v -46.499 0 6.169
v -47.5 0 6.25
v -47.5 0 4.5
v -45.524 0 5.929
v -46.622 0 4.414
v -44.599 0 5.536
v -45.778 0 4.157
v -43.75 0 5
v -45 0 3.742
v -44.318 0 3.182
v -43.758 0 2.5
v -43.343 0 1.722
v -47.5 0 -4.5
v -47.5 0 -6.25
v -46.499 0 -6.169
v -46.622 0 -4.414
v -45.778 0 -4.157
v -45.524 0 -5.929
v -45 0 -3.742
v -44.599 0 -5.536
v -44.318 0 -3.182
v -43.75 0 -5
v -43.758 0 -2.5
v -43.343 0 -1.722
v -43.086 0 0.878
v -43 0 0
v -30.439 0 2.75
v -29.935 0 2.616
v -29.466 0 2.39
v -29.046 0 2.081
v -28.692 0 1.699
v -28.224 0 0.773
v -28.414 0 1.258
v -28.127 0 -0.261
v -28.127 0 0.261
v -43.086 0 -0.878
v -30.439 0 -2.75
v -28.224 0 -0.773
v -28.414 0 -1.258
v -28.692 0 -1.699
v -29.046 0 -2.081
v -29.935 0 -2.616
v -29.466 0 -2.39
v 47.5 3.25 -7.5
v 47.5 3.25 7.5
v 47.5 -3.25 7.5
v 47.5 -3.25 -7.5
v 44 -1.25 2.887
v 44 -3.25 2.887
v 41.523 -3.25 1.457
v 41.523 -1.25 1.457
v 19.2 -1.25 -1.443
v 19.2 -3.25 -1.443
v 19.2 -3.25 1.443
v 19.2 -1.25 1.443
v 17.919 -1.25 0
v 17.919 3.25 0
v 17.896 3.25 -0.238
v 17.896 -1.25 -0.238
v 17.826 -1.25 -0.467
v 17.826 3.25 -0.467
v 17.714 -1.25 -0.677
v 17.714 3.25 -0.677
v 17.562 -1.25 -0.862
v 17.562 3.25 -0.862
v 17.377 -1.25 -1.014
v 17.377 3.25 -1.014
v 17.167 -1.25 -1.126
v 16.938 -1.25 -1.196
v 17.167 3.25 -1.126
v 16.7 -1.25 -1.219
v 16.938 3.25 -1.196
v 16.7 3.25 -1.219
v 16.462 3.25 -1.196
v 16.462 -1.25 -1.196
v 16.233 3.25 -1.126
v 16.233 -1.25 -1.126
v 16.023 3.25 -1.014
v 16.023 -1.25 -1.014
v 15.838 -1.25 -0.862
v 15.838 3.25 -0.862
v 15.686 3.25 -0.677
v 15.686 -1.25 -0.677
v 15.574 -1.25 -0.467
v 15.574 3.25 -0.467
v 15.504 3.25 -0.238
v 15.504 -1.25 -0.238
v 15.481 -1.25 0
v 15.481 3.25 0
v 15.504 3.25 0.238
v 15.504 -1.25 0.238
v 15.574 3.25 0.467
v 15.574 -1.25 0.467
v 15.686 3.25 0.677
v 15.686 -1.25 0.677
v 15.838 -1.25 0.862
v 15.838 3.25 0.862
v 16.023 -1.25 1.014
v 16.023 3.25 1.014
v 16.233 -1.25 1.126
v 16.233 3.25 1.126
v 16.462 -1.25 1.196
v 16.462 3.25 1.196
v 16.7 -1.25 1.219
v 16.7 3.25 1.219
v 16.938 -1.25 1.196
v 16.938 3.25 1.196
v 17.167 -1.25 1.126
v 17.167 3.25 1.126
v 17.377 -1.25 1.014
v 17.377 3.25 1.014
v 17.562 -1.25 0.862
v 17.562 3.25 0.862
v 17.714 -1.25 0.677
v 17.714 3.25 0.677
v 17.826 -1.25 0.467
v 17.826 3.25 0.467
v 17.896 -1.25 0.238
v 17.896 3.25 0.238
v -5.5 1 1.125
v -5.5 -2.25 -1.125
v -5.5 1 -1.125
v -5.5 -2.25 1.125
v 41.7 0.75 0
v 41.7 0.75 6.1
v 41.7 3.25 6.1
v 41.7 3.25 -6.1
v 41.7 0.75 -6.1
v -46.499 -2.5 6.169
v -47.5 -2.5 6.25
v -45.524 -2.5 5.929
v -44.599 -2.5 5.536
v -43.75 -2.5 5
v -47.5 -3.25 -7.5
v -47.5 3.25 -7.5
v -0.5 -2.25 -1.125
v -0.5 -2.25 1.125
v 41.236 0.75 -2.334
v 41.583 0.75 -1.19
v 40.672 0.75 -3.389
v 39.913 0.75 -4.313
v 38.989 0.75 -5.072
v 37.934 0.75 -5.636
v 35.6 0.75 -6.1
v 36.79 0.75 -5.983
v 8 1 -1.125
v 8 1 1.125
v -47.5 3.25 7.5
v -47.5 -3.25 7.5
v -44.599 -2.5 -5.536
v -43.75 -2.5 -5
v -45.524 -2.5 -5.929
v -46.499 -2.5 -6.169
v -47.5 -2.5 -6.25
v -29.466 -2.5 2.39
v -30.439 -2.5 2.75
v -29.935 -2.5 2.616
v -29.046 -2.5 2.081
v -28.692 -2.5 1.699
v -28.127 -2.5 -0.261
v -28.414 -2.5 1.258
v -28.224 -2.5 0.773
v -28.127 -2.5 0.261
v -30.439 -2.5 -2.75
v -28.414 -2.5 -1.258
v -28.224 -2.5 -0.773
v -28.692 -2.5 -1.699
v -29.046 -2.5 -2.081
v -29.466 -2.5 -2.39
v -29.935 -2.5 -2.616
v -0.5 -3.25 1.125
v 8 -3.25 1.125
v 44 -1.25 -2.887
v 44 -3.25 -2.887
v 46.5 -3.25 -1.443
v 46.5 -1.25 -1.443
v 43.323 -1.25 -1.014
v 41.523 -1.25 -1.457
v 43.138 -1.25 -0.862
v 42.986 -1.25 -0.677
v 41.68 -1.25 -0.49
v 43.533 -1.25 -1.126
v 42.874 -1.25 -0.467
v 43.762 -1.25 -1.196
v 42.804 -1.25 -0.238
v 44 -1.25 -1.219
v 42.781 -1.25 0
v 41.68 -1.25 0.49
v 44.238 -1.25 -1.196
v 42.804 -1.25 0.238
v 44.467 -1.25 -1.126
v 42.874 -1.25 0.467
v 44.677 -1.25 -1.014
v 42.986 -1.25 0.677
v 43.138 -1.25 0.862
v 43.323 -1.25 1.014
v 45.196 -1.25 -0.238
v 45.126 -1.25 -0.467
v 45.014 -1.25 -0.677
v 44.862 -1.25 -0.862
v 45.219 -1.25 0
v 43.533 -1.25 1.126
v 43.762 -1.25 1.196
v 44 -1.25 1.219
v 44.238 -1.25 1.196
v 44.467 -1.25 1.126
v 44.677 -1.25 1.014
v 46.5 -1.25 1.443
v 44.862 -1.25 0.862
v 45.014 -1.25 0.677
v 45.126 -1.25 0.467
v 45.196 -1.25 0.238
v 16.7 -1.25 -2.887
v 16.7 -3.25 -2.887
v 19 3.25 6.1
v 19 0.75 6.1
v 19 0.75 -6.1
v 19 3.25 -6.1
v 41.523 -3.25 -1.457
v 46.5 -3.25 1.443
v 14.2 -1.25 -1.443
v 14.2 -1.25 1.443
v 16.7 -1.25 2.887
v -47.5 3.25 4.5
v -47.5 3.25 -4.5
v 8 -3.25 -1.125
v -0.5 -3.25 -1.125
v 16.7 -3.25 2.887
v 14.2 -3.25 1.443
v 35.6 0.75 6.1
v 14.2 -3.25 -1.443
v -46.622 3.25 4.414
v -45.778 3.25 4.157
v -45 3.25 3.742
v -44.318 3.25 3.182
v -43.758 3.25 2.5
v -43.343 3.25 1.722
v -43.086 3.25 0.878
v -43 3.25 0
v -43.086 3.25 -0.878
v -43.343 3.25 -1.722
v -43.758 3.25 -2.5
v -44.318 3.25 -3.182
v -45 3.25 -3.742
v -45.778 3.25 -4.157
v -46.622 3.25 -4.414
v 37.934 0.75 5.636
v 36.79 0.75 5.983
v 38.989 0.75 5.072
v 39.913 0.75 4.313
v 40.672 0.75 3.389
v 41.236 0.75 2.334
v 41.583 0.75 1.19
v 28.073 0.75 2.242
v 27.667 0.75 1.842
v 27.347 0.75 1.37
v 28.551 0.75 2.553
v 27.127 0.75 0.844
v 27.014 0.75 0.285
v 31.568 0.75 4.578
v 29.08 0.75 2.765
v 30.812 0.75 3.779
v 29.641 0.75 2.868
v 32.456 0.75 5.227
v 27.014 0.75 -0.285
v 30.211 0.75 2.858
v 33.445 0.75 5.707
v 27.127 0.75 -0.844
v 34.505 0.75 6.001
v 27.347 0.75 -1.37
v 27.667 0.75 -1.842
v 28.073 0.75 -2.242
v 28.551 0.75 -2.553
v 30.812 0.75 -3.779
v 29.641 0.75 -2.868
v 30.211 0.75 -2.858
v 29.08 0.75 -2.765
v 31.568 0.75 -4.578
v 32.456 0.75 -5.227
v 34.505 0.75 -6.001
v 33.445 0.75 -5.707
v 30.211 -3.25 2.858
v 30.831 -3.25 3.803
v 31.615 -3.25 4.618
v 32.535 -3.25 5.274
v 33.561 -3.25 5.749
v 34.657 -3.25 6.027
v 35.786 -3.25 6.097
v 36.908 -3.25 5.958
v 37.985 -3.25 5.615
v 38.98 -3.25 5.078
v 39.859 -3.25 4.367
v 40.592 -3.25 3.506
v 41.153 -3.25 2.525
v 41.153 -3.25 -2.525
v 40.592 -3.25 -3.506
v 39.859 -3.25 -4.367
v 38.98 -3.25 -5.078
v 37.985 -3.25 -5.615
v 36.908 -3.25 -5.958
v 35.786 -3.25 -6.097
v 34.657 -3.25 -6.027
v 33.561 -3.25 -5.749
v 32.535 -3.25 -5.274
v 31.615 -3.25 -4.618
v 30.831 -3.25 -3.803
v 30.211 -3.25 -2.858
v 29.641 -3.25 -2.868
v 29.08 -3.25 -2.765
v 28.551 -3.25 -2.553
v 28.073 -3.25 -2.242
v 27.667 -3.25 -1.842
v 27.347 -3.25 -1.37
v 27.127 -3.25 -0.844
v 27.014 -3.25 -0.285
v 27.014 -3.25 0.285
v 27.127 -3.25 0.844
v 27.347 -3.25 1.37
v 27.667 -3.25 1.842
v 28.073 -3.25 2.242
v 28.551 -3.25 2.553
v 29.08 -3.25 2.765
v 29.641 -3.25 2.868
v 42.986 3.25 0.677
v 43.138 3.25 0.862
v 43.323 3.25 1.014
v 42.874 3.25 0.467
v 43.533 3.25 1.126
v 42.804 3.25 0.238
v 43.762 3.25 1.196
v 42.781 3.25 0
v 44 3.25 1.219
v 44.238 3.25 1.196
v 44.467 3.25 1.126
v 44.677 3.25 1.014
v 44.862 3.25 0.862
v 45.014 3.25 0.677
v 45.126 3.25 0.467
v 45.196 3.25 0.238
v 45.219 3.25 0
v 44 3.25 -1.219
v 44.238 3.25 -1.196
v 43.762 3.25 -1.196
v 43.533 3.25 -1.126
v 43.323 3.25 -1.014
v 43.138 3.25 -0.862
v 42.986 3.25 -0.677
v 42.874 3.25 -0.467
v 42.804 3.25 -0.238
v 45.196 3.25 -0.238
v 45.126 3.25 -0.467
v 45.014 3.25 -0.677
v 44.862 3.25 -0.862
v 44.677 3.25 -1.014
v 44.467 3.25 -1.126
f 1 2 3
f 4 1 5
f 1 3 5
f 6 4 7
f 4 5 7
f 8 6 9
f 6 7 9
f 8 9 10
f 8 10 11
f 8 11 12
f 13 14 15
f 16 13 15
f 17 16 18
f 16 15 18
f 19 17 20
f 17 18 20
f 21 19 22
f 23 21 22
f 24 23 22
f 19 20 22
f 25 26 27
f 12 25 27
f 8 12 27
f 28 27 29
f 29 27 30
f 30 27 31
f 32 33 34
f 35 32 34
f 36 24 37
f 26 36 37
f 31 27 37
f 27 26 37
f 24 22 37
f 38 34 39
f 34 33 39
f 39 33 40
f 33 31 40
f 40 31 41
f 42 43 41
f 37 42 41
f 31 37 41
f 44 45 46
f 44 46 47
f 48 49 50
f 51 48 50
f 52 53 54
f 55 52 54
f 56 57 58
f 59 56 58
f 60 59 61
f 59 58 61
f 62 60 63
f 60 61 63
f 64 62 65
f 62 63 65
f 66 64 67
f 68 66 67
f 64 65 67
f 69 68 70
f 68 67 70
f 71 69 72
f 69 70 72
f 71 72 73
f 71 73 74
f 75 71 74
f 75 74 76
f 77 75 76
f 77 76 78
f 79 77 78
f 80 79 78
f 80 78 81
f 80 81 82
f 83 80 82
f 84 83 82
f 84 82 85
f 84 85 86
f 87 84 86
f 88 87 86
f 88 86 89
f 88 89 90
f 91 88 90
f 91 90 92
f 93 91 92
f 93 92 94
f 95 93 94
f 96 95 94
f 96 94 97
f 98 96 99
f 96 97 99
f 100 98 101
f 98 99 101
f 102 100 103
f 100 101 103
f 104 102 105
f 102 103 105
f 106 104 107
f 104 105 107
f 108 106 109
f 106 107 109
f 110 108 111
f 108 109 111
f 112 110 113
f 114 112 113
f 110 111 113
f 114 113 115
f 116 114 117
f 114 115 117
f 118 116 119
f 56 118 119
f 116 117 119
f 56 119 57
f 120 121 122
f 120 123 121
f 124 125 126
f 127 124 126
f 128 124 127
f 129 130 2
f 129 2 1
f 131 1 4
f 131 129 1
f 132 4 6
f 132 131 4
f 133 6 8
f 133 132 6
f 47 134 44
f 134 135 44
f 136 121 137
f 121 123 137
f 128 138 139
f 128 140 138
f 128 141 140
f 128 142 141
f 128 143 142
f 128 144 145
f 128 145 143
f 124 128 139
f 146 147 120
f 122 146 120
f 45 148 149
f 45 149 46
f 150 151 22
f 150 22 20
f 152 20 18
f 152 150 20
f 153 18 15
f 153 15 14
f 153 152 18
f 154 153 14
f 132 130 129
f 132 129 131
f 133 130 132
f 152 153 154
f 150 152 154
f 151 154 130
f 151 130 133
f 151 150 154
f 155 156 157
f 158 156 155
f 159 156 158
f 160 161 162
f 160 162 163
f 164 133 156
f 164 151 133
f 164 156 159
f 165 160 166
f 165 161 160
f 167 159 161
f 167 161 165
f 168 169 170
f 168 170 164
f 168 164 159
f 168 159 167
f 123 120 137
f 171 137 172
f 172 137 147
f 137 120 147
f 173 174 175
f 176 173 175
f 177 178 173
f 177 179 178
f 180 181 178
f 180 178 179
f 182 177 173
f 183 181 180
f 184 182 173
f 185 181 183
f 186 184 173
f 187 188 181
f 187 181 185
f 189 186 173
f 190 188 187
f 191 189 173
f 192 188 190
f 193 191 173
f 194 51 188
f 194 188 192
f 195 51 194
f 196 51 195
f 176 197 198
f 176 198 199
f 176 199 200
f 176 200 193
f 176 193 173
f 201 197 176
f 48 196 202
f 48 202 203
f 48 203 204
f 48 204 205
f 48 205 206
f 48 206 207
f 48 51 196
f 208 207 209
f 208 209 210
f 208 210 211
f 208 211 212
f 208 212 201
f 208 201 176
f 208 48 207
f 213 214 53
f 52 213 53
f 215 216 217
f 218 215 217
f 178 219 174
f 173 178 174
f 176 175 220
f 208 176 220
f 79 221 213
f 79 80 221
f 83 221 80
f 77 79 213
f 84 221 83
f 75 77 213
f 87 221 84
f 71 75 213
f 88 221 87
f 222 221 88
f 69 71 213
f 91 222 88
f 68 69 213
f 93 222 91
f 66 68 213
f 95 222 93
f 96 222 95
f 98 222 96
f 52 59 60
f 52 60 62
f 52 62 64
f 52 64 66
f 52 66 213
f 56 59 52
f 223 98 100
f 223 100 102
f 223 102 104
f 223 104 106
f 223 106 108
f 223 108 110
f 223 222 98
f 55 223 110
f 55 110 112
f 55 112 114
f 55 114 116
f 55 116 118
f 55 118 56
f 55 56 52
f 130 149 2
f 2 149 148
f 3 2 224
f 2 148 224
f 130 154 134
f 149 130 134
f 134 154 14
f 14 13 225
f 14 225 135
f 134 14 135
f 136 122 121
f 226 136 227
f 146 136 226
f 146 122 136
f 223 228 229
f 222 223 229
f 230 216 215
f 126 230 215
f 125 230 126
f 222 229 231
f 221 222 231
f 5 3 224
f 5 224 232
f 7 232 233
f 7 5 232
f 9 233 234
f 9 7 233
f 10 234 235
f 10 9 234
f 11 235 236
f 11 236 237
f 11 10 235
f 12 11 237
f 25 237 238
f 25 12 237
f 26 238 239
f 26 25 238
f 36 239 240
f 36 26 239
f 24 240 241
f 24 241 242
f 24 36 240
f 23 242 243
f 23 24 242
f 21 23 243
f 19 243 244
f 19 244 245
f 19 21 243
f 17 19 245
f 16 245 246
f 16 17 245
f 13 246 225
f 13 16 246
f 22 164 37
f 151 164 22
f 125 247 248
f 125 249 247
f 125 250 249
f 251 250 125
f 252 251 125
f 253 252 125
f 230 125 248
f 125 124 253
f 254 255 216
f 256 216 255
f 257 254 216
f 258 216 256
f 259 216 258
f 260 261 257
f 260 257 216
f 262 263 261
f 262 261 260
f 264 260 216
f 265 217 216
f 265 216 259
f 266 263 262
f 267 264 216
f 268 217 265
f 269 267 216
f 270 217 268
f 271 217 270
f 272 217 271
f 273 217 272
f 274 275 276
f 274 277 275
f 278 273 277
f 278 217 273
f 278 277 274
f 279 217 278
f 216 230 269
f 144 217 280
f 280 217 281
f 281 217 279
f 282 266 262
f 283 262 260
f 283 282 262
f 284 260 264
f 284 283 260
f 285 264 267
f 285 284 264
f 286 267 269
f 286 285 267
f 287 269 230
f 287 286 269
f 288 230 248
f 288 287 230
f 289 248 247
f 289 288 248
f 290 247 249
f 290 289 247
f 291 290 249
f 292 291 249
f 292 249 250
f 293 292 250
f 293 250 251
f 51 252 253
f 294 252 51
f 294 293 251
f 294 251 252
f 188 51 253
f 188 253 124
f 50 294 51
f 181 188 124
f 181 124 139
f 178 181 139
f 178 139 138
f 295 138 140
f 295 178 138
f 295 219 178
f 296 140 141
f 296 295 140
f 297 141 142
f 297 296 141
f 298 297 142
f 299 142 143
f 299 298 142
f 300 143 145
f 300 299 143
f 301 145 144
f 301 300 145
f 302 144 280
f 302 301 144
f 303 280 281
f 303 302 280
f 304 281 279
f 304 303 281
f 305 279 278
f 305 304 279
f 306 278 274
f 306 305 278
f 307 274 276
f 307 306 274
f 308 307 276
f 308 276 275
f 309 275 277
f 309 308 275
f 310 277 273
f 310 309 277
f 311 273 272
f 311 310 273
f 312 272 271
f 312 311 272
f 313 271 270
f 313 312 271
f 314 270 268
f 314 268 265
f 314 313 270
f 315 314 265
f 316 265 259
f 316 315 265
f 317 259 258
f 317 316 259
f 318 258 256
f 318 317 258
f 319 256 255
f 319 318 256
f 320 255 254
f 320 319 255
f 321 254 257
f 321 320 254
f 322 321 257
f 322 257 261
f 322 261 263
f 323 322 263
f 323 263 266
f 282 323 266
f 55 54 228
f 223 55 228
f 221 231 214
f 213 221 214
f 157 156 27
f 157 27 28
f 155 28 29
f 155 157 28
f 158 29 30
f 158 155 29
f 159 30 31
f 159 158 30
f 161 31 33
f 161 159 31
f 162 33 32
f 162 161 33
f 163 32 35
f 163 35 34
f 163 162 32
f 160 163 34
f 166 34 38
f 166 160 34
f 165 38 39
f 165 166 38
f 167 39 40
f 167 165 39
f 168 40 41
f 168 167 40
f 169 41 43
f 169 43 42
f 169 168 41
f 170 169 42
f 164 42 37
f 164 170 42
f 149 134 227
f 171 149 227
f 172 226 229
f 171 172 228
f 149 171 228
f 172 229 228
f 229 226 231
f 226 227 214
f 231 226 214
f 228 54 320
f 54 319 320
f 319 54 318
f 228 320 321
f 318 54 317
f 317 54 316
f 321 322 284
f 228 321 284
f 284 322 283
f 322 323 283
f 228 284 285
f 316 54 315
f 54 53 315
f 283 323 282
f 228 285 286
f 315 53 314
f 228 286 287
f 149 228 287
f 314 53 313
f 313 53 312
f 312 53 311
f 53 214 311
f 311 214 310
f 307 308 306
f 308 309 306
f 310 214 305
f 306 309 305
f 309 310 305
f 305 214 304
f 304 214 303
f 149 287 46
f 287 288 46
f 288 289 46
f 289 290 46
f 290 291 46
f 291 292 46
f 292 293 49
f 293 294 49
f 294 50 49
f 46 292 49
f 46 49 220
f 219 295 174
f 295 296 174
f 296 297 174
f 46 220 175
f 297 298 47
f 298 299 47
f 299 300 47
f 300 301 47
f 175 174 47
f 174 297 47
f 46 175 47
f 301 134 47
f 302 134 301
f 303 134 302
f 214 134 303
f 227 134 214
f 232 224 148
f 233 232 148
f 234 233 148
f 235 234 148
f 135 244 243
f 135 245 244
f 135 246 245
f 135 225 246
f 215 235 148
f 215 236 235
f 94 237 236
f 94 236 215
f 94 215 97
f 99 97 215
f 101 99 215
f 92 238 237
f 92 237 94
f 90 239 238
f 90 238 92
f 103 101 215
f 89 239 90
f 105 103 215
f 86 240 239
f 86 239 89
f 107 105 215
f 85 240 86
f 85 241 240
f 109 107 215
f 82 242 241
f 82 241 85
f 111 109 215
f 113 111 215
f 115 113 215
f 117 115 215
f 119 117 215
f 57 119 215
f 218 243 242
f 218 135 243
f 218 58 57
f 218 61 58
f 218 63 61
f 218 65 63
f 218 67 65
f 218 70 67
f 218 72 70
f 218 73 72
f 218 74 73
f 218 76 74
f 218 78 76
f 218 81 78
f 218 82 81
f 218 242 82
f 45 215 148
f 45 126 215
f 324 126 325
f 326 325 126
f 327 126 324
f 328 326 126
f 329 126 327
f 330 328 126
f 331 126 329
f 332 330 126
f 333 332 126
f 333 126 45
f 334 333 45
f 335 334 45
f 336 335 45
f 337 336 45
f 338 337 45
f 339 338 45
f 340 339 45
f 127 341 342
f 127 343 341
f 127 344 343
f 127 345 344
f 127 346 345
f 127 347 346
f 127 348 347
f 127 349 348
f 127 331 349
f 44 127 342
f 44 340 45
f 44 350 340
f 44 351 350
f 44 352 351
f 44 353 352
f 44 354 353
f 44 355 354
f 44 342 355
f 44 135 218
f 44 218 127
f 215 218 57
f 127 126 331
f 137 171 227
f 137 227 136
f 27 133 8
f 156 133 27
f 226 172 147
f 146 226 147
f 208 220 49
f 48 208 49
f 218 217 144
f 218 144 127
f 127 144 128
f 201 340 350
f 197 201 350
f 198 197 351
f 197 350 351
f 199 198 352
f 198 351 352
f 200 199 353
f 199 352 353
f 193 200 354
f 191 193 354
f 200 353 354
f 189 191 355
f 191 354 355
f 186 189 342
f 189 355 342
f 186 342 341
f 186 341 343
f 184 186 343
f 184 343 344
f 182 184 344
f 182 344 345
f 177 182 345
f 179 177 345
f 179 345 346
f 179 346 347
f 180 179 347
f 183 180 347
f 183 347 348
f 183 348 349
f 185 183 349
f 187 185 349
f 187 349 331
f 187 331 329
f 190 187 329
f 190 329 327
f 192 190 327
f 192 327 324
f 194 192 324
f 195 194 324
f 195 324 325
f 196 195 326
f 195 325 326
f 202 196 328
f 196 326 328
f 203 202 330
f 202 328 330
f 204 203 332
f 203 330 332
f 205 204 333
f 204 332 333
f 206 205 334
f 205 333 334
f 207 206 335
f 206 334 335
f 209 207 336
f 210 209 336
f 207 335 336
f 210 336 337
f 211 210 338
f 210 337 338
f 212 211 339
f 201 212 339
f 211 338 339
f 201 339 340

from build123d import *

# Parameters (mm, degrees)
SKETCH2_W                   = 95
SKETCH2_H                   = 15
BOSS_EXTRUDE1_DEPTH         = 3.25
CAVITY1_START               = -2.5
CAVITY1_DEPTH               = 2.5
CAVITY1_START_2             = -1.5
CAVITY1_2_DEPTH             = 4.75
CAVITY1_3_DEPTH             = 1.5
CUT_EXTRUDE1_START          = -5.75
CUT_EXTRUDE1_DEPTH          = 5.75
CUT_EXTRUDE2_START          = -1
CUT_EXTRUDE2_DEPTH          = 1
F_41_0_096_DIAMETER_HOLE1_D = 2.4384
CUT_EXTRUDE4_DEPTH          = 2
CAVITY2_START               = -3.25
CAVITY2_DEPTH               = 6.5
CAVITY2_START_2             = 0.75
CAVITY2_2_DEPTH             = 2.5
SKETCH12_W                  = 22.7
SKETCH12_H                  = 12.2
SKETCH12_W_2                = 22.5
SKETCH12_H_2                = 12
CUT_EXTRUDE6_DEPTH          = 2.5
CUT_EXTRUDE7_START          = -4
CUT_EXTRUDE7_DEPTH          = 4
SKETCH15_W                  = 8.5
SKETCH15_H                  = 4.25
SKETCH15_W_2                = 5
SKETCH15_H_2                = 3.25
CUT_EXTRUDE8_DEPTH          = 1.125


# Read off the part's stored shape, not the designer's step: Cavity1, Cavity2
with BuildPart() as part:
    # Sketch2 → Boss-Extrude1 (new, symmetric)
    with BuildSketch(Plane(origin=(0, 0, 0), x_dir=(1, 0, 0), z_dir=(0, 1, 0))):
        Rectangle(SKETCH2_W, SKETCH2_H)
    extrude(amount=BOSS_EXTRUDE1_DEPTH, both=True)

    # Cavity1 outline → Cavity1 (cut)
    with BuildSketch(Plane(origin=(0, 0, 0), x_dir=(1, 0, 0), z_dir=(0, 1, 0)).offset(CAVITY1_START)):
        with BuildLine():
            ThreePointArc((-47.5, 2.875), (-44.625, 0), (-47.5, -2.875))
            Line((-47.5, -2.875), (-47.5, -3.425))
            ThreePointArc((-47.5, -3.425), (-44.075, 0), (-47.5, 3.425))
            Line((-47.5, 3.425), (-47.5, 2.875))
        make_face()
        with BuildLine():
            Line((-47.5, 6.25), (-47.5, 4.5))
            ThreePointArc((-47.5, 4.5), (-43, 0), (-47.5, -4.5))
            Line((-47.5, -4.5), (-47.5, -6.25))
            ThreePointArc((-47.5, -6.25), (-45.523576462, -5.929270613), (-43.75, -5))
            Line((-43.75, -5), (-30.438820488, -2.75))
            ThreePointArc((-30.438820488, -2.75), (-28.114646288, 0), (-30.438820488, 2.75))
            Line((-30.438820488, 2.75), (-43.75, 5))
            ThreePointArc((-43.75, 5), (-45.523576462, 5.929270613), (-47.5, 6.25))
        make_face()
    extrude(amount=CAVITY1_DEPTH, mode=Mode.SUBTRACT)

    # Cavity1 2 outline → Cavity1 2 (cut)
    with BuildSketch(Plane(origin=(0, 0, 0), x_dir=(1, 0, 0), z_dir=(0, 1, 0)).offset(CAVITY1_START_2)):
        with BuildLine():
            ThreePointArc((-47.5, 3), (-44.5, 0), (-47.5, -3))
            Line((-47.5, -3), (-47.5, -4.5))
            ThreePointArc((-47.5, -4.5), (-43, 0), (-47.5, 4.5))
            Line((-47.5, 4.5), (-47.5, 3))
        make_face()
    extrude(amount=CAVITY1_2_DEPTH, mode=Mode.SUBTRACT)

    # Cavity1 3 outline → Cavity1 3 (cut)
    with BuildSketch(Plane(origin=(0, 0, 0), x_dir=(1, 0, 0), z_dir=(0, 1, 0)).offset(CAVITY1_START_2)):
        with BuildLine():
            Line((-47.5, 2.875), (-47.5, 1.5))
            ThreePointArc((-47.5, 1.5), (-46, 0), (-47.5, -1.5))
            Line((-47.5, -1.5), (-47.5, -2.875))
            ThreePointArc((-47.5, -2.875), (-44.625, 0), (-47.5, 2.875))
        make_face()
    extrude(amount=CAVITY1_3_DEPTH, mode=Mode.SUBTRACT)

    # Sketch4 → Cut-Extrude1 (cut)
    with BuildSketch(Plane(origin=(0, 3.25, 0), x_dir=(1, 0, 0), z_dir=(0, 1, 0)).offset(CUT_EXTRUDE1_START)):
        with BuildLine():
            Line((-47.5, 3), (-47.5, -3))
            ThreePointArc((-47.5, -3), (-44.5, 0), (-47.5, 3))
        make_face()
    extrude(amount=CUT_EXTRUDE1_DEPTH, mode=Mode.SUBTRACT)

    # Sketch6 → Cut-Extrude2 (cut)
    with BuildSketch(Plane(origin=(0, -1.5, 0), x_dir=(1, 0, 0), z_dir=(0, 1, 0)).offset(CUT_EXTRUDE2_START)):
        with BuildLine():
            Line((-47.5, 4.5), (-47.5, 3.425))
            ThreePointArc((-47.5, 3.425), (-44.075, 0), (-47.5, -3.425))
            Line((-47.5, -3.425), (-47.5, -4.5))
            ThreePointArc((-47.5, -4.5), (-43, 0), (-47.5, 4.5))
        make_face()
    extrude(amount=CUT_EXTRUDE2_DEPTH, mode=Mode.SUBTRACT)

    # #41 (0.096) Diameter Hole1 (through all)
    with Locations(Plane(origin=(0, -3.25, 0), x_dir=(-1, 0, 0), z_dir=(0, -1, 0))):
        with Locations((-44, 0), (-16.7, 0)):
            Hole(F_41_0_096_DIAMETER_HOLE1_D / 2)

    # Sketch10 → Cut-Extrude4 (cut)
    with BuildSketch(Plane.XZ.offset(3.25)):
        Polygon((46.5, -1.443375673), (46.5, 1.443375673), (44, 2.886751346), (41.5, 1.443375673), (41.5, -1.443375673), (44, -2.886751346), align=None)
        Polygon((16.7, 2.886751346), (14.2, 1.443375673), (14.2, -1.443375673), (16.7, -2.886751346), (19.2, -1.443375673), (19.2, 1.443375673), align=None)
    extrude(amount=-CUT_EXTRUDE4_DEPTH, mode=Mode.SUBTRACT)

    # Cavity2 outline → Cavity2 (cut)
    with BuildSketch(Plane(origin=(0, 0, 0), x_dir=(1, 0, 0), z_dir=(0, 1, 0)).offset(CAVITY2_START)):
        with BuildLine():
            ThreePointArc((30.267317748, -2.75), (41.6, 0), (30.267317748, 2.75))
            ThreePointArc((30.267317748, 2.75), (27.1, 0), (30.267317748, -2.75))
        make_face()
    extrude(amount=CAVITY2_DEPTH, mode=Mode.SUBTRACT)

    # Cavity2 2 outline → Cavity2 2 (cut)
    with BuildSketch(Plane(origin=(0, 0, 0), x_dir=(1, 0, 0), z_dir=(0, 1, 0)).offset(CAVITY2_START_2)):
        with BuildLine():
            Line((19.1, 6), (19.1, -6))
            Line((19.1, -6), (35.6, -6))
            ThreePointArc((35.6, -6), (32.477501001, -5.123475383), (30.267317748, -2.75))
            ThreePointArc((30.267317748, -2.75), (27.1, 0), (30.267317748, 2.75))
            ThreePointArc((30.267317748, 2.75), (32.477501001, 5.123475383), (35.6, 6))
            Line((35.6, 6), (19.1, 6))
        make_face()
        with BuildLine():
            ThreePointArc((41.5, -1.090871211), (39.4376277, -4.61222437), (35.6, -6))
            Line((35.6, -6), (41.6, -6))
            Line((41.6, -6), (41.6, 0))
            ThreePointArc((41.6, 0), (41.574947699, -0.547722558), (41.5, -1.090871211))
        make_face()
        with BuildLine():
            Line((41.6, 6), (35.6, 6))
            ThreePointArc((35.6, 6), (39.4376277, 4.612224369), (41.5, 1.090871211))
            ThreePointArc((41.5, 1.090871211), (41.574947699, 0.547722558), (41.6, 0))
            Line((41.6, 0), (41.6, 6))
        make_face()
    extrude(amount=CAVITY2_2_DEPTH, mode=Mode.SUBTRACT)

    # Sketch12 → Cut-Extrude6 (cut)
    with BuildSketch(Plane(origin=(0, 0.75, 0), x_dir=(1, 0, 0), z_dir=(0, 1, 0))):
        with Locations((30.35, 0)):
            Rectangle(SKETCH12_W, SKETCH12_H)
        with Locations((30.35, 0)):
            Rectangle(SKETCH12_W_2, SKETCH12_H_2, mode=Mode.SUBTRACT)
    extrude(amount=CUT_EXTRUDE6_DEPTH, mode=Mode.SUBTRACT)

    # Sketch13 → Cut-Extrude7 (cut)
    with BuildSketch(Plane(origin=(0, 0.75, 0), x_dir=(1, 0, 0), z_dir=(0, 1, 0)).offset(CUT_EXTRUDE7_START)):
        with BuildLine():
            ThreePointArc((30.211004889, -2.858099316), (41.7, 0), (30.211004889, 2.858099316))
            ThreePointArc((30.211004889, 2.858099316), (27, 0), (30.211004889, -2.858099316))
        make_face()
        with BuildLine():
            ThreePointArc((30.267317748, 2.75), (41.6, 0), (30.267317748, -2.75))
            ThreePointArc((30.267317748, -2.75), (27.1, 0), (30.267317748, 2.75))
        make_face(mode=Mode.SUBTRACT)
    extrude(amount=CUT_EXTRUDE7_DEPTH, mode=Mode.SUBTRACT)

    # Sketch15 → Cut-Extrude8 (cut, symmetric)
    with BuildSketch(Plane.XY):
        with Locations((3.75, -1.125)):
            Rectangle(SKETCH15_W, SKETCH15_H)
        with Locations((-3, -0.625)):
            Rectangle(SKETCH15_W_2, SKETCH15_H_2)
    extrude(amount=CUT_EXTRUDE8_DEPTH, both=True, mode=Mode.SUBTRACT)


solid = part.part
